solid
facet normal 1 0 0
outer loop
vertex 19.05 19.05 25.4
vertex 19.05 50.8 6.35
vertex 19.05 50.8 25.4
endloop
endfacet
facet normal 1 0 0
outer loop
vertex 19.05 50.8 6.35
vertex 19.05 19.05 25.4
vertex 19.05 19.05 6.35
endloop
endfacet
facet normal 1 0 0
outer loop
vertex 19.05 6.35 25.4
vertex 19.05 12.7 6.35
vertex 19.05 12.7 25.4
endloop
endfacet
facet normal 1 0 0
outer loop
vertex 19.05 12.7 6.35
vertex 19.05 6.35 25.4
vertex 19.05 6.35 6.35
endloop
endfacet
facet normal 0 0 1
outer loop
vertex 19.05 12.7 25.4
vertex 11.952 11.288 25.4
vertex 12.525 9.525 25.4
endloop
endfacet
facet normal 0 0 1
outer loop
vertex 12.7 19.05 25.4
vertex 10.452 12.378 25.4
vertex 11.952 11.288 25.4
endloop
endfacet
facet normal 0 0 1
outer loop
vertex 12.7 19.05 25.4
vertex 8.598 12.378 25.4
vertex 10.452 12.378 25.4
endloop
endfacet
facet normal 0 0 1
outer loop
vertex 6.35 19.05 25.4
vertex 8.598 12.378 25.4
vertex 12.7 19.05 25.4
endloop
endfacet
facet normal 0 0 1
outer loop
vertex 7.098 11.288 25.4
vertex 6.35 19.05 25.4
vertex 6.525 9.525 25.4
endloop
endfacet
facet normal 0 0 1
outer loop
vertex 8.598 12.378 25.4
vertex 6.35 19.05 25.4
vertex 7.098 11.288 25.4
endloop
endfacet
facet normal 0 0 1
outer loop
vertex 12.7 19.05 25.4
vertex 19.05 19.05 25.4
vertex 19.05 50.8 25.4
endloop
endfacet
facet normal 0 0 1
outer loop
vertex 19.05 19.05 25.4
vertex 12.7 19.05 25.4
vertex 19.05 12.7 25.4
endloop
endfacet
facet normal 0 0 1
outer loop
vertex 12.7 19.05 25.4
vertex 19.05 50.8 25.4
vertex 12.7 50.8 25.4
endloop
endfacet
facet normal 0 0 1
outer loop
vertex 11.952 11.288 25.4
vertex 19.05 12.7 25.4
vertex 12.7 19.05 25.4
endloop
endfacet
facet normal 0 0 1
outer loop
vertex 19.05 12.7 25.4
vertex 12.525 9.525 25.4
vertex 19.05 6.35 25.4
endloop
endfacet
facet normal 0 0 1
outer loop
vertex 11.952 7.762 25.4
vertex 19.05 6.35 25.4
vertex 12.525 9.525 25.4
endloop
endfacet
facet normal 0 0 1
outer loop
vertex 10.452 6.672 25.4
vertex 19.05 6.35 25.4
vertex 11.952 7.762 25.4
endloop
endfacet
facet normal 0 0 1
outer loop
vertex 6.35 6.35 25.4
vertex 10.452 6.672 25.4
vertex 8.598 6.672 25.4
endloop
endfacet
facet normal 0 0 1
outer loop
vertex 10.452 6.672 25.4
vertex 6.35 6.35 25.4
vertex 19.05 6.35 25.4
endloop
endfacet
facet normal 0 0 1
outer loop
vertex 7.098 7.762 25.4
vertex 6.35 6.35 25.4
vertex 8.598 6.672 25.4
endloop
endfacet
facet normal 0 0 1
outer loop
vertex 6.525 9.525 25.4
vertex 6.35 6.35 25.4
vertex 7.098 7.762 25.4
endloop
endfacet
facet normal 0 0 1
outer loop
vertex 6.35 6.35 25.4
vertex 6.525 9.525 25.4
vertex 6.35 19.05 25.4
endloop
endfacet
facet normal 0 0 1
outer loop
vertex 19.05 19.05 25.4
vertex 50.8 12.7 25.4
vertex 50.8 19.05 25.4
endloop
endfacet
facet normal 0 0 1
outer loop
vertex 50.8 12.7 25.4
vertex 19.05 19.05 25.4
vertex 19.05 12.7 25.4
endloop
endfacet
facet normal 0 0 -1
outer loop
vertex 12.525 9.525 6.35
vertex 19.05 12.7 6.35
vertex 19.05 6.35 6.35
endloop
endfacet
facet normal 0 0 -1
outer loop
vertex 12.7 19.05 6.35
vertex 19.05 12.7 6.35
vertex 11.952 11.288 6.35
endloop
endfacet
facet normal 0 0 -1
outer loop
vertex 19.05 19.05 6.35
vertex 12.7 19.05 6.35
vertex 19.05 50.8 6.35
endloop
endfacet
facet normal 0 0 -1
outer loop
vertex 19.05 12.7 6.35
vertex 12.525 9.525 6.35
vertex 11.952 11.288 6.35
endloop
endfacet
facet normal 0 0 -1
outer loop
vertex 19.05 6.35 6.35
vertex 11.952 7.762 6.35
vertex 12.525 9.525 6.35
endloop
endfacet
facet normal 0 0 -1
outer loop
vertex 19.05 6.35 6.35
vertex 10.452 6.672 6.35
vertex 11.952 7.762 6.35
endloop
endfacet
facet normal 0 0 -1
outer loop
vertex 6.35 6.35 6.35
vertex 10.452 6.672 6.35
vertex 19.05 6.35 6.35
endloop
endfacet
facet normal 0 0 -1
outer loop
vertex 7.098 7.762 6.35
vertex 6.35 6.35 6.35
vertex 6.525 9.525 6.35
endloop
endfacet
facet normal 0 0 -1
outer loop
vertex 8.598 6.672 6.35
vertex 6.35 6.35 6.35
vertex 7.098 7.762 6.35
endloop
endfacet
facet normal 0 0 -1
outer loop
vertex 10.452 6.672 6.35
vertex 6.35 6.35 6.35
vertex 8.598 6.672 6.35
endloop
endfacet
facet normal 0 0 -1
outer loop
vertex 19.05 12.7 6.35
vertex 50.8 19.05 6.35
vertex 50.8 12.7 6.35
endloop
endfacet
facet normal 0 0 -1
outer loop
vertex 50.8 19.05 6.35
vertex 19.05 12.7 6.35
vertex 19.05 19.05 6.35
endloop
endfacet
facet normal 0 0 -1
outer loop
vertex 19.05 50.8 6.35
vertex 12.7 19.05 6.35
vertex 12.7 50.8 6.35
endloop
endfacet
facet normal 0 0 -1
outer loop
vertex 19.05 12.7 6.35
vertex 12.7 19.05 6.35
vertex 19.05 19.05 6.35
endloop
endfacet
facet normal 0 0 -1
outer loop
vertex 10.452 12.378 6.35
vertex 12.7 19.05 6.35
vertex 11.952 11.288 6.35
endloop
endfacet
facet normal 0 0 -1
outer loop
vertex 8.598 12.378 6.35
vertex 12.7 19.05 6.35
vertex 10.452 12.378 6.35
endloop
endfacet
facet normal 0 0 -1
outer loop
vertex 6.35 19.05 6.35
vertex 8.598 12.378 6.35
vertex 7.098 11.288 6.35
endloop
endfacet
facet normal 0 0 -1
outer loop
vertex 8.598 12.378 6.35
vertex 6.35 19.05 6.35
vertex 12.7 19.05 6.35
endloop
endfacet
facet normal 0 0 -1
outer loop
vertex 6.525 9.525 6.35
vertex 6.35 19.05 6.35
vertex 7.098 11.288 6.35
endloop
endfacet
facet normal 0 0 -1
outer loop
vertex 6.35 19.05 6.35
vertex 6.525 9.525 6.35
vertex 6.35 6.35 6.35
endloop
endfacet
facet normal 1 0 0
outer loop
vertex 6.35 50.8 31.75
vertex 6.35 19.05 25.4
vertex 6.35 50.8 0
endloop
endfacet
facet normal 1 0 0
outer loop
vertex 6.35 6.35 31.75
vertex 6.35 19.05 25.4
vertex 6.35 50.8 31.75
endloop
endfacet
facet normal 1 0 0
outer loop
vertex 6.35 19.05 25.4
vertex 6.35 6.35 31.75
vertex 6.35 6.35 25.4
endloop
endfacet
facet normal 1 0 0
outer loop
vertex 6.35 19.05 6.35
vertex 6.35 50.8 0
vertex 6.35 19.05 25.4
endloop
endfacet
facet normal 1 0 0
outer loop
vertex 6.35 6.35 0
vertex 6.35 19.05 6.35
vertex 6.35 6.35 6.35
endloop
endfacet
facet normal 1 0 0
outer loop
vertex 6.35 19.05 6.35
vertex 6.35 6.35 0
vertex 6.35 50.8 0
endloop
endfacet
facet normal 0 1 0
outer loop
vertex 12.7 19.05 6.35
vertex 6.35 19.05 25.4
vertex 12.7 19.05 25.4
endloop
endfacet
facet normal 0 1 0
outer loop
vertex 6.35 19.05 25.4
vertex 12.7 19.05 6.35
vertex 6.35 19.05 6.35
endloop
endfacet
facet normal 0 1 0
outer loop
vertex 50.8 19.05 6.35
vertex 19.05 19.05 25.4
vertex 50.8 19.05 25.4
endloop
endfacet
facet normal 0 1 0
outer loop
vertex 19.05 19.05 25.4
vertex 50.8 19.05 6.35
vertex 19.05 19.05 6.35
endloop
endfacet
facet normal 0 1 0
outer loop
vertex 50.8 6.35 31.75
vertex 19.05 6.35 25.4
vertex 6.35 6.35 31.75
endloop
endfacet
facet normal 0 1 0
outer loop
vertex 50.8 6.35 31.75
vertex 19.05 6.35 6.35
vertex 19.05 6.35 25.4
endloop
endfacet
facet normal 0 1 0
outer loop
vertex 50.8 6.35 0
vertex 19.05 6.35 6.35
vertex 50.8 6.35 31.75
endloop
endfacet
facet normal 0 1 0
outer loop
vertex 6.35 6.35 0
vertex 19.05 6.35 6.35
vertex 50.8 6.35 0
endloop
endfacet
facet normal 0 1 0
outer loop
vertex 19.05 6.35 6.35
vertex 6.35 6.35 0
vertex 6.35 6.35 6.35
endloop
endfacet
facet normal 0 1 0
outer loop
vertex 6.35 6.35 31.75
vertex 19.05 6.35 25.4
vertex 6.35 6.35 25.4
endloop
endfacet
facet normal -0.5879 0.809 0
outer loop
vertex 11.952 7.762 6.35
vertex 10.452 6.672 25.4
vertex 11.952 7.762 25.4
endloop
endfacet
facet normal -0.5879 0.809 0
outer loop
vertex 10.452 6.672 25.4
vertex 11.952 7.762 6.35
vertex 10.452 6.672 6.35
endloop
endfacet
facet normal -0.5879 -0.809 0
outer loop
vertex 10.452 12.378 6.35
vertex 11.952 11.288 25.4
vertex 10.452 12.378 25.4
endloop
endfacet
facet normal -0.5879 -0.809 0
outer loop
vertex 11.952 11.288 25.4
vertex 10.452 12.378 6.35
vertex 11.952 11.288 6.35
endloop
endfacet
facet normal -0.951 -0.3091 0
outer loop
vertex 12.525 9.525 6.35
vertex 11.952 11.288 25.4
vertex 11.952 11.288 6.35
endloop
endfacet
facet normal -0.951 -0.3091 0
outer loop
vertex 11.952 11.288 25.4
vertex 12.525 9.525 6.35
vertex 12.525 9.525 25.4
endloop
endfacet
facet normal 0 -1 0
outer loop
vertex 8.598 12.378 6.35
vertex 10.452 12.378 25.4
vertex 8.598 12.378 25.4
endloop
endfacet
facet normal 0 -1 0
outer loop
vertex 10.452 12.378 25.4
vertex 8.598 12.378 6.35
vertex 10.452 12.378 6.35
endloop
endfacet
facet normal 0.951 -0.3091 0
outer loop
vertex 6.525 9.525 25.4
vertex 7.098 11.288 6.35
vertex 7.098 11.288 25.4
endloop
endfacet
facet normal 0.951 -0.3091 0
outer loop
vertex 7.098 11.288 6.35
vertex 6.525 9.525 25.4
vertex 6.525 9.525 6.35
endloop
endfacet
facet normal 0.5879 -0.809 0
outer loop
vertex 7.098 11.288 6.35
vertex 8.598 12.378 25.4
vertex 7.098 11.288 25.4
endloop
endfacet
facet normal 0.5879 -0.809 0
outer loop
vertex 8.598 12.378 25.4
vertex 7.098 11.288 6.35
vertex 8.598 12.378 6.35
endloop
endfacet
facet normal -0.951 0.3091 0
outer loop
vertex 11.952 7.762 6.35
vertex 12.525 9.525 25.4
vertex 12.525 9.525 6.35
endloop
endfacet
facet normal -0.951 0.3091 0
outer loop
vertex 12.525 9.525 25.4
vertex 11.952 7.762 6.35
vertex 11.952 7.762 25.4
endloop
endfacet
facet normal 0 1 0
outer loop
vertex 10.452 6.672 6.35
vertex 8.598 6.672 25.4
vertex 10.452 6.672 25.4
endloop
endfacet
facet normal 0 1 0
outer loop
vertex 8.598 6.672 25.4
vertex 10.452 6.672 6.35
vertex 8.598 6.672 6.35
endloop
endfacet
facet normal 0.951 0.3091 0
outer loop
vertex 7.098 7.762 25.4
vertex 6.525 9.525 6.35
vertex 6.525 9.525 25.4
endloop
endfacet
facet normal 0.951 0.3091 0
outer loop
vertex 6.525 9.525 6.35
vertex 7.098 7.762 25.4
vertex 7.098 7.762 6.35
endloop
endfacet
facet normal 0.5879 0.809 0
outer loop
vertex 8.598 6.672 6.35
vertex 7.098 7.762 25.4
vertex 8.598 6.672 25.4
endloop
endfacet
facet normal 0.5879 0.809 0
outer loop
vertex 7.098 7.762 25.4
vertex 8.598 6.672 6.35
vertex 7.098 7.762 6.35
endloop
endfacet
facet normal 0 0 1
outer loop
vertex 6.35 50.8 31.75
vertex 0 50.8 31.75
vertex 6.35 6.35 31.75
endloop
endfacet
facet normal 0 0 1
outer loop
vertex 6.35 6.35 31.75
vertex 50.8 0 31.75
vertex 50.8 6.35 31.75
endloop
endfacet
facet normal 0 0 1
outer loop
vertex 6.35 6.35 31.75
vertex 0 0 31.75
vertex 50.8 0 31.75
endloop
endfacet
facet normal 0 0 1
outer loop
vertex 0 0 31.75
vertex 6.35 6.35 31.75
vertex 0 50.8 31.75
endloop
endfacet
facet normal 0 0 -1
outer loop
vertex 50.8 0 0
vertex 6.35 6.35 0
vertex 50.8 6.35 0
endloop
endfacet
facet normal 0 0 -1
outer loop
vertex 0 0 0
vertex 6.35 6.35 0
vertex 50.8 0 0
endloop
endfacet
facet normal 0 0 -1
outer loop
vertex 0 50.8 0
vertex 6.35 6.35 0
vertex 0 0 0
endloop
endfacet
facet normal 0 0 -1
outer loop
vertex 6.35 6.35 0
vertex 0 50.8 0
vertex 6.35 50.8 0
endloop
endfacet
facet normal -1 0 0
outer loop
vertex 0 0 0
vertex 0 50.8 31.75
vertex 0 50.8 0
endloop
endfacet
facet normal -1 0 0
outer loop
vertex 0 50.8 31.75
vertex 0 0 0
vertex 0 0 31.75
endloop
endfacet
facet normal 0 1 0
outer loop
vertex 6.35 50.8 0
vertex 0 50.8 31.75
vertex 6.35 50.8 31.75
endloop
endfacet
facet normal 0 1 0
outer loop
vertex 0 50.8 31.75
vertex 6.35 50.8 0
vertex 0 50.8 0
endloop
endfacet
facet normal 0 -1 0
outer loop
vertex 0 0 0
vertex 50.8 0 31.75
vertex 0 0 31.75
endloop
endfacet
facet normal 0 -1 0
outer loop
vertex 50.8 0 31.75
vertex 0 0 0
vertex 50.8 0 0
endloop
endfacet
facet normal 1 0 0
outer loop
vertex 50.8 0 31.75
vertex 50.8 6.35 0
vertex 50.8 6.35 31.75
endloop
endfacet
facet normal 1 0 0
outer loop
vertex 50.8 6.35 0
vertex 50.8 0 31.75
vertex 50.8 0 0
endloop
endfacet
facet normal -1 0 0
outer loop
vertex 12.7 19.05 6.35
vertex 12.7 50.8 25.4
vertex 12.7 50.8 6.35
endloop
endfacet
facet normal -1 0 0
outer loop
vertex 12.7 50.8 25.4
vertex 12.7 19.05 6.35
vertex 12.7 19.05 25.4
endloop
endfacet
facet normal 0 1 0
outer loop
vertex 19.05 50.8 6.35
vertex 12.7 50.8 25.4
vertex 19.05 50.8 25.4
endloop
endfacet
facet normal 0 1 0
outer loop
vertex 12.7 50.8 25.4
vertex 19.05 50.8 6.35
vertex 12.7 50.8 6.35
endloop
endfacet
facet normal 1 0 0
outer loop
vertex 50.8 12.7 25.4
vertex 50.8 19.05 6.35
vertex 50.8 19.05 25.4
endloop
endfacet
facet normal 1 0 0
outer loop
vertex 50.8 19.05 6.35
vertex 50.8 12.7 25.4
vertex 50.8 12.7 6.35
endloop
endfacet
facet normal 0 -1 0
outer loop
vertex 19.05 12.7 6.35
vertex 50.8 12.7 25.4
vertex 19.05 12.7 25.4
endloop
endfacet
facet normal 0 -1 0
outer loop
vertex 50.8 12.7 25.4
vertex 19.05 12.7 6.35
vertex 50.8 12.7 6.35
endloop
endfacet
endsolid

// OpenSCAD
/**
 * corner-bracket.scad is part of Paper Laptop.
 * It describes a corner joint for the laptop's sides 
 * and bottom.working sides, bottom and top.
 *
 * @author R. S. Doiel, <rsdoiel@gmail.com>
 * copyright (c) 2016 all rights reserved
 * Released under a BSD 2-clause license
 */

// Guessing fiber board is about 1/4th inch thick, 
// i.e. 6.35mm

/*
 * Corner
 */
module corner (t) {
    a = t; 
    b = t*8.0;
    c = t*4.0;

    /* outside 1 */
    color([1,0,0]) cube([a,b,c+t]);
    
    /* outside 2 */
    color([1,0,0]) cube([b,a,c+t]);

    /* core */
    difference() {
        translate([t, t, t]) {
            color([1,0,0]) cube([t*2,t*2,c-t]);
        }
        translate([t*1.5, t*1.5, t]) {
            /* hole for bolt */
            color([1,1,1]) cylinder(c-t, 3, 3, false);
        }
    }

    /* inside 1 */
    translate([t*2, 0, t]) {
        color([1,1,0]) cube([a,b,c-t]);
    }

    /* inside 2 */
    translate([0, t*2, t]) {
        color([1,1,0]) cube([b,a,c-t]);
    }
    
}

// 1/4th inch ~= 6.35mm
corner(6.35);
